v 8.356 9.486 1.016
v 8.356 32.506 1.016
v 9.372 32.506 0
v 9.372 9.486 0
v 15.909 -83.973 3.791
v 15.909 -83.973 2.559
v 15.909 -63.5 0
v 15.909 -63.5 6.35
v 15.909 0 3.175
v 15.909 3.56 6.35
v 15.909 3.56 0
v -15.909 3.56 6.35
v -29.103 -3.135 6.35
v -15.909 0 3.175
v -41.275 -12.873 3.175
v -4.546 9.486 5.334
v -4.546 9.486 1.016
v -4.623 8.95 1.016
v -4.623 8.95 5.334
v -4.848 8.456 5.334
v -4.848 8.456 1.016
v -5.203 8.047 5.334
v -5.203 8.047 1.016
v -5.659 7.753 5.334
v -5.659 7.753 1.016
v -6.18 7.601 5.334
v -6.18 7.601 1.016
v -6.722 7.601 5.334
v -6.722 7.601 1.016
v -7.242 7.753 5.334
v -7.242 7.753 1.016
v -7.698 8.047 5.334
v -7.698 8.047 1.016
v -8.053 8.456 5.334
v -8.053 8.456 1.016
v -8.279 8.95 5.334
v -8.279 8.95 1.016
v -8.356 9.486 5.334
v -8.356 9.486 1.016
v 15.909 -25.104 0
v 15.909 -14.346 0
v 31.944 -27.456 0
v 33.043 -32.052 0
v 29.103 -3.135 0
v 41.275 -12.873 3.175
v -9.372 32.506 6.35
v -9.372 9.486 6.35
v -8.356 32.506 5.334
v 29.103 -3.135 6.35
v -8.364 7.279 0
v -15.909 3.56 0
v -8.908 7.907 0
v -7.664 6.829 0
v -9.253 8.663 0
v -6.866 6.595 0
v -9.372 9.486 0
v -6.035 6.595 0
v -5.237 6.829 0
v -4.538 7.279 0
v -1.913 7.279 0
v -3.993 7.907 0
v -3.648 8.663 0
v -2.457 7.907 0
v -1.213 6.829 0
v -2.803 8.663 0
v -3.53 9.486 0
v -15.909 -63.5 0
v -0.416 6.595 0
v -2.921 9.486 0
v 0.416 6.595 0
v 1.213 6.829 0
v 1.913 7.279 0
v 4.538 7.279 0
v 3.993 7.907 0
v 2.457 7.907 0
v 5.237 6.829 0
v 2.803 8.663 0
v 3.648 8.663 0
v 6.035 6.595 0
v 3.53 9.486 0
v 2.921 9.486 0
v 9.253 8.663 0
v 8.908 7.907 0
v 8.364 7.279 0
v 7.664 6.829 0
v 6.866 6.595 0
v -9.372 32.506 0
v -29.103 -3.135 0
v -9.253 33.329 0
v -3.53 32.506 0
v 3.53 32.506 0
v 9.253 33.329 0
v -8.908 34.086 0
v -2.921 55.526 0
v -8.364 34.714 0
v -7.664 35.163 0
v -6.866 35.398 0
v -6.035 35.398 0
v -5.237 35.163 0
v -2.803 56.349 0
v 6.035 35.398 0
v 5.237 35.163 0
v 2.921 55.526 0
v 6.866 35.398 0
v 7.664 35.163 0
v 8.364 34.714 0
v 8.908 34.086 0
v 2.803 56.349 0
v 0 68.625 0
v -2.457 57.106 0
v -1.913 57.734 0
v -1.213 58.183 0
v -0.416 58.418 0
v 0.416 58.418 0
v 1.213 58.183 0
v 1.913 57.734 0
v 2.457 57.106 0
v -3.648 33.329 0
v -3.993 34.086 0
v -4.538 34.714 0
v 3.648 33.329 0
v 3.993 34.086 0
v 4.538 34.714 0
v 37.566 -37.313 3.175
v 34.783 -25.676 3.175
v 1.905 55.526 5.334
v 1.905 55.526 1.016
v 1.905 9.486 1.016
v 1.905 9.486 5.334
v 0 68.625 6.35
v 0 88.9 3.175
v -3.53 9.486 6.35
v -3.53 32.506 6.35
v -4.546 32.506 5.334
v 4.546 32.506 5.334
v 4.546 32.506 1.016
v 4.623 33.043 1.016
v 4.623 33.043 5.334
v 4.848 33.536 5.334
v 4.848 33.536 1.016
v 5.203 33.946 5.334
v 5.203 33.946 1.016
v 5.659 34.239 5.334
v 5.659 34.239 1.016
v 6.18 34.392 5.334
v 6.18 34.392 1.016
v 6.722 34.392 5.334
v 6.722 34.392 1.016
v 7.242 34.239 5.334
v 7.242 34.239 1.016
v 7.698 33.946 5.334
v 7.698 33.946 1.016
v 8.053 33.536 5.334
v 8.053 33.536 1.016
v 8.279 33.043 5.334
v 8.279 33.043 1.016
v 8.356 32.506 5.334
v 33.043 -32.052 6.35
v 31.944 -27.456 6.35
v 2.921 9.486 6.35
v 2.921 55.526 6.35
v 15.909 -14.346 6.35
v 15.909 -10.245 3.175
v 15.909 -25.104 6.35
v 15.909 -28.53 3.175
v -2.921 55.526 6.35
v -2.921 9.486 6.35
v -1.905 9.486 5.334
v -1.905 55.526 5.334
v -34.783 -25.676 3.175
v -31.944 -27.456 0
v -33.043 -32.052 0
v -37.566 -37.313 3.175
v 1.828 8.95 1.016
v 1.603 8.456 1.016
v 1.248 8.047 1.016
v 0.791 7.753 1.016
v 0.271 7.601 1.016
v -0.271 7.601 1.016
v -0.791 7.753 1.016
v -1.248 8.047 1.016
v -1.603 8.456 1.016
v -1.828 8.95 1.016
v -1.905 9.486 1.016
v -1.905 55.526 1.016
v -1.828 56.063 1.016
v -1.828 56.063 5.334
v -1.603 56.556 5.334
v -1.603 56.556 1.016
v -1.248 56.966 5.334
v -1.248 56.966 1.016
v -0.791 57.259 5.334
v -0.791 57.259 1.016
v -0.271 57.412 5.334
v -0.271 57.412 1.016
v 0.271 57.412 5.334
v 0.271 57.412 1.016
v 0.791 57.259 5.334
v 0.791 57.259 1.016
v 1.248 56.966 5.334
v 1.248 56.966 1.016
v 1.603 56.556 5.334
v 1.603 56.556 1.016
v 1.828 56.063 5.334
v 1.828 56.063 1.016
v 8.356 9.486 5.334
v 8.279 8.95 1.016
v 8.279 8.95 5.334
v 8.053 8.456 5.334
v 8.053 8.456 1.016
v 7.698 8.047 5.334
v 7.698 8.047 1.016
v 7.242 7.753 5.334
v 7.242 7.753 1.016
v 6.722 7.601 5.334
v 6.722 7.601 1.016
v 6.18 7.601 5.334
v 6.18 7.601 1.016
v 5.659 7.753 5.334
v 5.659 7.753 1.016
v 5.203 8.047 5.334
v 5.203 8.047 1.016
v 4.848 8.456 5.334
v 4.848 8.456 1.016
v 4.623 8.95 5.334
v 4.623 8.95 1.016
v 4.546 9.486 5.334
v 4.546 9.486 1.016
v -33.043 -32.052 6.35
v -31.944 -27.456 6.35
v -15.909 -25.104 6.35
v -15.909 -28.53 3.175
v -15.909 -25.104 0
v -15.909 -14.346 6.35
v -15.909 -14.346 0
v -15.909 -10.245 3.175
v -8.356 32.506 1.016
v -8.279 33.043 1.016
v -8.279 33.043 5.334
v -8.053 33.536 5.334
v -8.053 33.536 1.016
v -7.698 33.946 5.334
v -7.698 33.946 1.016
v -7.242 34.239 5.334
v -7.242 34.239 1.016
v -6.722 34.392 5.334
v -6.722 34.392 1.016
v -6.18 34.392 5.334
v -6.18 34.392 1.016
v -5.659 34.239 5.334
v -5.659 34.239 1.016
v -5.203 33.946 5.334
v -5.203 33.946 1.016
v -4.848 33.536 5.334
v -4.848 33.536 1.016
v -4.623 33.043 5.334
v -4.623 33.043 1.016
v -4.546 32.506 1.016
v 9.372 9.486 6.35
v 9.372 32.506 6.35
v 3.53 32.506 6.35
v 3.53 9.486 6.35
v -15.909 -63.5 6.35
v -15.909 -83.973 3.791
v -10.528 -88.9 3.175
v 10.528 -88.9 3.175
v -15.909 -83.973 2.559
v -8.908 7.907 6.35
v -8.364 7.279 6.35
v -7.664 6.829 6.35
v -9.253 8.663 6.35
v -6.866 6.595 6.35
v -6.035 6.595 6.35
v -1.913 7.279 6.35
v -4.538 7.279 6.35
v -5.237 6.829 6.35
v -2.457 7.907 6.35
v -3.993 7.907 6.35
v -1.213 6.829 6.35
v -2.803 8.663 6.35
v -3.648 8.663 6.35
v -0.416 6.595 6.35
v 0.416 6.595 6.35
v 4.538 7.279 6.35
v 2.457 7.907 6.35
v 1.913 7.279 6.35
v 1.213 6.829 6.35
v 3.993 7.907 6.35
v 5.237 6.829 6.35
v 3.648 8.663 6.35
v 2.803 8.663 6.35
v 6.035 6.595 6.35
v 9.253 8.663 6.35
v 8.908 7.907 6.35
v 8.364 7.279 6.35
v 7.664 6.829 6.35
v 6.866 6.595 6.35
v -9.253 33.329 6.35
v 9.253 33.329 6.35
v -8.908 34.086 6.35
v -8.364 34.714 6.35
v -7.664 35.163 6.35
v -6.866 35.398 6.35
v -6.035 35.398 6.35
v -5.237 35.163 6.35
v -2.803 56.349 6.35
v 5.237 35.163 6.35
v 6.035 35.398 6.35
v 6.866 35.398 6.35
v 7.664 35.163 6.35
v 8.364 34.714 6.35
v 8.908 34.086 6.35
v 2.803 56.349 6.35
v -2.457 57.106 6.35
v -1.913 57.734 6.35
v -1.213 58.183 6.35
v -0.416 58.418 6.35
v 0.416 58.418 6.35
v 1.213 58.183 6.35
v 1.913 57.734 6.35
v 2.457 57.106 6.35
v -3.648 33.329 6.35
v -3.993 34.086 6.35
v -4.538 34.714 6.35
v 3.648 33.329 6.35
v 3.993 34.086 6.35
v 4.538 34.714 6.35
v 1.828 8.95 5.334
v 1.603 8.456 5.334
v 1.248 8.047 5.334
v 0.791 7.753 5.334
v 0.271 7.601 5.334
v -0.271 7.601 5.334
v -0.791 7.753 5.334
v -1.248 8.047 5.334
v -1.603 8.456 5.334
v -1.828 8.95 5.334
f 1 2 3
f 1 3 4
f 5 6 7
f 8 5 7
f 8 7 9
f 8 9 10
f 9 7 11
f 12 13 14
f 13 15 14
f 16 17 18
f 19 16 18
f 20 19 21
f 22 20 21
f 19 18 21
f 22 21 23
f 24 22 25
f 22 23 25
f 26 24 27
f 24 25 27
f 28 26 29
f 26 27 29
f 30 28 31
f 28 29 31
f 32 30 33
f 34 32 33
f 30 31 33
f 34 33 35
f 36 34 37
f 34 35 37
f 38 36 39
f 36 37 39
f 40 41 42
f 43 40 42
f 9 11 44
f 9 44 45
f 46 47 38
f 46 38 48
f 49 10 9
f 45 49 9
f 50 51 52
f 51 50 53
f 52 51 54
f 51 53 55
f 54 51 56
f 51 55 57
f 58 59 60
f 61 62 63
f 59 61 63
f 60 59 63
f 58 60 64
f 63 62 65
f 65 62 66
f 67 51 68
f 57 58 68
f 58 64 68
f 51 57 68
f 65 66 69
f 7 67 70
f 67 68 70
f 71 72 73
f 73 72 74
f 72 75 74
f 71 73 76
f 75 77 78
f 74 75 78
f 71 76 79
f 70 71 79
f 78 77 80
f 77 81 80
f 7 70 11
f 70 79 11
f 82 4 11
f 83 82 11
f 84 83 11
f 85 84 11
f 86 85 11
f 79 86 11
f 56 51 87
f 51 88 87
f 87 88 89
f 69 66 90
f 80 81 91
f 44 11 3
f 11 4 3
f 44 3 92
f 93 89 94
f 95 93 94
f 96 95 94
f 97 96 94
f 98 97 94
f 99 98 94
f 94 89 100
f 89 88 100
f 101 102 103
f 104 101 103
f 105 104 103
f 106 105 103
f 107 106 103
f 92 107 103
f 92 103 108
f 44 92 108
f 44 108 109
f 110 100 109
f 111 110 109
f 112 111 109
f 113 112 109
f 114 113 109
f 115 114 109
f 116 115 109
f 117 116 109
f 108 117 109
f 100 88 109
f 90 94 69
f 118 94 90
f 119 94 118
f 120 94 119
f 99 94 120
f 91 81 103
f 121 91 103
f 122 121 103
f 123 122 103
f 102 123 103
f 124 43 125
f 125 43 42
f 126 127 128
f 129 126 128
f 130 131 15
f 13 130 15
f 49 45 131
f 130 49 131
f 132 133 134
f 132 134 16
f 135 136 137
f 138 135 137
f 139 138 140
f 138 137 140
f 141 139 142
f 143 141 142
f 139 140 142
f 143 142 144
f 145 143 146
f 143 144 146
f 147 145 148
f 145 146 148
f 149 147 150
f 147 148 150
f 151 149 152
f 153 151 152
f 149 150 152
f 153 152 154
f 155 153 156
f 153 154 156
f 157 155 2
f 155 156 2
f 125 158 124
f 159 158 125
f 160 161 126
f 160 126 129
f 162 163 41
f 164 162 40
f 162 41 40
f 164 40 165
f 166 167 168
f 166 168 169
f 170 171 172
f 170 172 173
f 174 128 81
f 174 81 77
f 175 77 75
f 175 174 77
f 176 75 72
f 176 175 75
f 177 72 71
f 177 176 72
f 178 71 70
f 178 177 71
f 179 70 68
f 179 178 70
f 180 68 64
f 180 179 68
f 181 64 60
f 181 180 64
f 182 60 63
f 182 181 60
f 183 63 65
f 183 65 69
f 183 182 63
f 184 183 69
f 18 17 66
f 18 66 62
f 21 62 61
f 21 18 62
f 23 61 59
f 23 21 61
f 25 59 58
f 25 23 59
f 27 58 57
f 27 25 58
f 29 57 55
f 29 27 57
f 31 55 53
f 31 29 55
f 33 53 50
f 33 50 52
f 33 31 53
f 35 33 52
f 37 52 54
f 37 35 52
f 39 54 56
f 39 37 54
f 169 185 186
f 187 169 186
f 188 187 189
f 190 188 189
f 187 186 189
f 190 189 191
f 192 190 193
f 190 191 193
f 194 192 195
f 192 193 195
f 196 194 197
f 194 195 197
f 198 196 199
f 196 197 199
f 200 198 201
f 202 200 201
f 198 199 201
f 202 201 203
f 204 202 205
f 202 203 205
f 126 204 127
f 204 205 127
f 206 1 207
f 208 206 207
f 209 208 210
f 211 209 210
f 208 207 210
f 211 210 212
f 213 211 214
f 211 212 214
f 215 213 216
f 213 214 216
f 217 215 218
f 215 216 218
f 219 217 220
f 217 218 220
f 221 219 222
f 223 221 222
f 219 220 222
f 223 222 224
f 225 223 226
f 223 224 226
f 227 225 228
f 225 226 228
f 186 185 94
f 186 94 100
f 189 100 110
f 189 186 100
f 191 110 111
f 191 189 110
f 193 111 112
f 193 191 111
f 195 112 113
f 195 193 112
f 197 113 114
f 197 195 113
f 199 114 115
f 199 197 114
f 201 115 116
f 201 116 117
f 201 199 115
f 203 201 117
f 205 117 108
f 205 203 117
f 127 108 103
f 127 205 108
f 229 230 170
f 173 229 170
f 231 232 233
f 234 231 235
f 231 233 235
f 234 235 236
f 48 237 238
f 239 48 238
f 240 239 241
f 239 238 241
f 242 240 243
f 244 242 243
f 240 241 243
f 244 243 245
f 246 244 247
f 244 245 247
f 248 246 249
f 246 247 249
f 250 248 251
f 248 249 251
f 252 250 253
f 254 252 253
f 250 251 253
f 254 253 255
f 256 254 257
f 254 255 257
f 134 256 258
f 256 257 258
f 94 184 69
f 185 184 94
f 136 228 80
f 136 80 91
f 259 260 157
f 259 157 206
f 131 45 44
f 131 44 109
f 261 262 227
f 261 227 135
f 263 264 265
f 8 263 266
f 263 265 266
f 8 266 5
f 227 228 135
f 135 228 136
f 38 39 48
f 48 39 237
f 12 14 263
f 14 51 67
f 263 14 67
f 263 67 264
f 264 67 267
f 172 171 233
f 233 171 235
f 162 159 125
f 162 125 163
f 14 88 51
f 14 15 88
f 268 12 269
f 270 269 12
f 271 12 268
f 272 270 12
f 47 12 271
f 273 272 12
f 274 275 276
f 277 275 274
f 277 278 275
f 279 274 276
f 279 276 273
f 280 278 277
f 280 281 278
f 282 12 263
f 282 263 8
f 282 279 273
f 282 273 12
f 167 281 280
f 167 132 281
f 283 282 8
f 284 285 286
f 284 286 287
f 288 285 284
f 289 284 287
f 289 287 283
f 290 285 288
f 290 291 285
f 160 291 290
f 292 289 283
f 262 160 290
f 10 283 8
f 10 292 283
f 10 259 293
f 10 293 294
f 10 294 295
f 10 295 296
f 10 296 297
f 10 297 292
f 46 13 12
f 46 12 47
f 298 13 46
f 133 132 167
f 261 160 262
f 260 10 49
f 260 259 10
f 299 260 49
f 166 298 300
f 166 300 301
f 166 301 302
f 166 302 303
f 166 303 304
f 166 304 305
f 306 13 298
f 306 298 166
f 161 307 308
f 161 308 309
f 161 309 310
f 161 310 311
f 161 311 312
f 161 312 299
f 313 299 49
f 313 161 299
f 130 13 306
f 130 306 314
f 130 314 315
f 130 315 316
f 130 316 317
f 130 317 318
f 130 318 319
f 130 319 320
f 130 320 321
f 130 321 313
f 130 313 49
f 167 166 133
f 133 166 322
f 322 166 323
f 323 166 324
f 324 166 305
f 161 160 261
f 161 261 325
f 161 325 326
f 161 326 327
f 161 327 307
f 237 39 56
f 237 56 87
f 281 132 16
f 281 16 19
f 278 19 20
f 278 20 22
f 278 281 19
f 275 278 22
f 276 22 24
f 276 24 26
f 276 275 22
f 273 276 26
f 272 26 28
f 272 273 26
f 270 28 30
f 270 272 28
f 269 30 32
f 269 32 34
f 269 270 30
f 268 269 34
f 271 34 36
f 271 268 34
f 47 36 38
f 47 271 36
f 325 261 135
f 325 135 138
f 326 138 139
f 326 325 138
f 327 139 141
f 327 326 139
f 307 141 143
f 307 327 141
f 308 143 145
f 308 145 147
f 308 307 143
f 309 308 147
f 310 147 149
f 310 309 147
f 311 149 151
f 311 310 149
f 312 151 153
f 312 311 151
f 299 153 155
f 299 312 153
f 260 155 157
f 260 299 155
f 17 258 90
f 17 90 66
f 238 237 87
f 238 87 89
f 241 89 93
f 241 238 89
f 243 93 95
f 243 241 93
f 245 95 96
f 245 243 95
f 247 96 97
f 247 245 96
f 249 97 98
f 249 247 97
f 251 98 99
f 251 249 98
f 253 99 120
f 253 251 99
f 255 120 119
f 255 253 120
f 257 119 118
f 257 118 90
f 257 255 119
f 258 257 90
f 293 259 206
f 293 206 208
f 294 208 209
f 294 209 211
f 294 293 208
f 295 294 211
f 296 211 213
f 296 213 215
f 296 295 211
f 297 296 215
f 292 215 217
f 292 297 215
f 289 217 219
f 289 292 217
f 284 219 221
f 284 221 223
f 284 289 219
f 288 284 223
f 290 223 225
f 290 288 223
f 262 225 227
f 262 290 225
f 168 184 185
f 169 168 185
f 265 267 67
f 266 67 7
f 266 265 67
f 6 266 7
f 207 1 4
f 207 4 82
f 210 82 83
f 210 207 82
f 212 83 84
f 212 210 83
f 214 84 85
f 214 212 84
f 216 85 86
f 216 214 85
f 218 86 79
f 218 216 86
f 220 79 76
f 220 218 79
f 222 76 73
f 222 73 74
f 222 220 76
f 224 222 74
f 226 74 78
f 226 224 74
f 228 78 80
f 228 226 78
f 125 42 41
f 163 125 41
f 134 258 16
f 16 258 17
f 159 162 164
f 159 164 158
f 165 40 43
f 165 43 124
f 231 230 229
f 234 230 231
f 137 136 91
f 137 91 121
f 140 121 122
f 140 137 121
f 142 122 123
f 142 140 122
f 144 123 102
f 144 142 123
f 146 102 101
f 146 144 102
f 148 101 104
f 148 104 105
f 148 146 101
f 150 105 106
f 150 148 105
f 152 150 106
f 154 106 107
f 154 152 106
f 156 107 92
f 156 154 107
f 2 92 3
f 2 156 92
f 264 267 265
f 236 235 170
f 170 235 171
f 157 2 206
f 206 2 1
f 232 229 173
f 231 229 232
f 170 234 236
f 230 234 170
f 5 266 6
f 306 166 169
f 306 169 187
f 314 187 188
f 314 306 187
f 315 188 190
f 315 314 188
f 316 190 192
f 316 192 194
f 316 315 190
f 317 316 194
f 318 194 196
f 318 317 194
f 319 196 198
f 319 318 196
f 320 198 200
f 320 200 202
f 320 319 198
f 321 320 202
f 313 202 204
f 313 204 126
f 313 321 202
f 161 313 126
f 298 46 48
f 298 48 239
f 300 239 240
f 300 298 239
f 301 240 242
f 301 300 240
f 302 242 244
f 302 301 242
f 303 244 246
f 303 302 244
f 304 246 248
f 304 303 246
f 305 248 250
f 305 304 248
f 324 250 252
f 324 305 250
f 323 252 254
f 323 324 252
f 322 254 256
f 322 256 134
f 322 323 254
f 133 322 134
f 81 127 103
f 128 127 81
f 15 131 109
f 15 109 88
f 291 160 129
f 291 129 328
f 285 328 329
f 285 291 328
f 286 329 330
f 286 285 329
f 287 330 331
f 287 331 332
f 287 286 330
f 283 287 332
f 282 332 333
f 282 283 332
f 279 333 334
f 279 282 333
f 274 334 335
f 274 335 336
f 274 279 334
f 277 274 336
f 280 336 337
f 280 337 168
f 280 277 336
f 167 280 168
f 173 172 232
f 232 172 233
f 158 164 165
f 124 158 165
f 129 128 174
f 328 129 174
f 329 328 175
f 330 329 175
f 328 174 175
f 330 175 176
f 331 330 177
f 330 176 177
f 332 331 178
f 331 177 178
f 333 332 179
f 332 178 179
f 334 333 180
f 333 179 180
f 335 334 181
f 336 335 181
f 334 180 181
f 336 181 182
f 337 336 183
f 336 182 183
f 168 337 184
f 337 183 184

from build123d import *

# Parameters (mm, degrees)
F1_DEPTH   = 6.35
F2_DEPTH   = 6.35
F3_DEPTH   = 6.35
F4_SIZE2   = 3.175
F4_SIZE    = 7.62
F4_2_SIZE2 = 3.17499
F4_2_SIZE  = 7.61999
F5_SIZE2   = 3.17499
F5_SIZE    = 3.17499
F6_SIZE2   = 3.17499
F6_SIZE    = 3.17499
F6_2_SIZE2 = 3.17499
F6_2_SIZE  = 3.17499
F7_SIZE    = 1.016
F8_SIZE2   = 3.175
F8_SIZE    = 25.4
F8_2_SIZE2 = 3.17499
F8_2_SIZE  = 25.39999


# Not quite as in the source:
# - a fillet or chamfer is up to 0.001 mm smaller than in the source, because OpenCascade refuses the exact size


with BuildPart() as f1:
    # F0 (on Top) → F1 (new body)
    with BuildSketch(Plane.XY):
        Polygon((41.275, -12.8728821874), (0, 88.9), (-41.275, -12.8728821874), (-15.9091800451, 0), (-15.9091800451, -10.2451825514), (-15.9091800451, -28.5296985704), (-15.9091800451, -83.9729532599), (-10.527680628, -88.9), (10.527680628, -88.9), (15.9091800451, -83.9729532599), (15.9091800451, -28.5296985704), (15.9091800451, -10.2451825514), (15.9091800451, 0), align=None)
        with BuildLine():
            Line((-8.355671237, 9.4862803817), (-8.355671237, 32.5063206255))
            ThreePointArc((-8.355671237, 32.5063206255), (-6.450671237, 34.4113206255), (-4.545671237, 32.5063206255))
            Line((-4.545671237, 32.5063206255), (-4.545671237, 9.4862803817))
            ThreePointArc((-4.545671237, 9.4862803817), (-6.450671237, 7.5812803817), (-8.355671237, 9.4862803817))
        make_face(mode=Mode.SUBTRACT)
        with BuildLine():
            Line((4.545671237, 9.4862803817), (4.545671237, 32.5063206255))
            ThreePointArc((4.545671237, 32.5063206255), (6.450671237, 34.4113206255), (8.355671237, 32.5063206255))
            Line((8.355671237, 32.5063206255), (8.355671237, 9.4862803817))
            ThreePointArc((8.355671237, 9.4862803817), (6.450671237, 7.5812803817), (4.545671237, 9.4862803817))
        make_face(mode=Mode.SUBTRACT)
        with BuildLine():
            Line((-1.905, 9.4862803817), (-1.905, 55.5263608694))
            ThreePointArc((-1.905, 55.5263608694), (0, 57.4313608694), (1.905, 55.5263608694))
            Line((1.905, 55.5263608694), (1.905, 9.4862803817))
            ThreePointArc((1.905, 9.4862803817), (0, 7.5812803817), (-1.905, 9.4862803817))
        make_face(mode=Mode.SUBTRACT)
    extrude(amount=F1_DEPTH)

    # F4
    f4_edges = [f1.edges().sort_by_distance(p)[0] for p in [
        (-20.6375, 38.013559, 0),
        (20.6375, 38.013559, 0),
    ]]
    f4_side = f1.faces().sort_by_distance((0, -6.764351, 0))[0]
    chamfer(f4_edges, length=F4_SIZE, length2=F4_SIZE2, reference=f4_side)

    # F4#2 (size 7.62 and 3.175 in the source; OpenCascade refuses exactly that, so slightly less here)
    f4_2_edges = [f1.edges().sort_by_distance(p)[0] for p in [
        (20.6375, 38.013559, 6.35),
        (-20.6375, 38.013559, 6.35),
    ]]
    f4_2_side = f1.faces().sort_by_distance((0, -6.764351, 6.35))[0]
    chamfer(f4_2_edges, length=F4_2_SIZE, length2=F4_2_SIZE2, reference=f4_2_side)

    # F5 (size 3.175 and 3.175 in the source; OpenCascade refuses exactly that, so slightly less here)
    f5_edges = [f1.edges().sort_by_distance(p)[0] for p in [
        (23.41519, -3.80922, 6.35),
        (23.415183, -3.809216, 0),
        (-23.41519, -3.80922, 6.35),
        (-23.415183, -3.809216, 0),
    ]]
    chamfer(f5_edges, length=F5_SIZE, length2=F5_SIZE2)

    # F7
    f7_edges = [f1.edges().sort_by_distance(p)[0] for p in [
        (-8.355671, 20.996301, 6.35),
        (-6.450671, 7.58128, 6.35),
        (-4.545671, 20.996301, 6.35),
        (-6.450671, 34.411321, 6.35),
        (-1.905, 32.506321, 6.35),
        (0, 7.58128, 6.35),
        (1.905, 32.506321, 6.35),
        (0, 57.431361, 6.35),
        (8.355671, 20.996301, 6.35),
        (6.450671, 34.411321, 6.35),
        (4.545671, 20.996301, 6.35),
        (6.450671, 7.58128, 6.35),
        (-6.450671, 7.58128, 0),
        (0, 7.58128, 0),
        (6.450671, 7.58128, 0),
        (4.545671, 20.996301, 0),
        (8.355671, 20.996301, 0),
        (-1.905, 32.506321, 0),
        (1.905, 32.506321, 0),
        (-4.545671, 20.996301, 0),
        (-8.355671, 20.996301, 0),
        (6.450671, 34.411321, 0),
        (-6.450671, 34.411321, 0),
        (0, 57.431361, 0),
    ]]
    chamfer(f7_edges, length=F7_SIZE)

    # F8
    f8_edges = [f1.edges().sort_by_distance(p)[0] for p in [
        (0, -88.9, 6.35),
    ]]
    f8_side = f1.faces().sort_by_distance((0, -23.545695, 6.35))[0]
    chamfer(f8_edges, length=F8_SIZE, length2=F8_SIZE2, reference=f8_side)

    # F8#2 (size 25.4 and 3.175 in the source; OpenCascade refuses exactly that, so slightly less here)
    f8_2_edges = [f1.edges().sort_by_distance(p)[0] for p in [
        (0, -88.9, 0),
    ]]
    f8_2_side = f1.faces().sort_by_distance((0, -23.545717, 0))[0]
    chamfer(f8_2_edges, length=F8_2_SIZE, length2=F8_2_SIZE2, reference=f8_2_side)


with BuildPart() as f2:
    # F0 (on Top) → F2 (new body)
    with BuildSketch(Plane.XY):
        Polygon((-15.9091800451, -28.5296985704), (-15.9091800451, -10.2451825514), (-34.7830280662, -25.6761983037), (-37.5656671822, -37.3127013445), align=None)
    extrude(amount=F2_DEPTH)

    # F6 (size 3.175 and 3.175 in the source; OpenCascade refuses exactly that, so slightly less here)
    f6_edges = [f2.edges().sort_by_distance(p)[0] for p in [
        (-25.346104, -17.96069, 6.35),
        (-25.346104, -17.96069, 0),
        (-36.174348, -31.49445, 6.35),
        (-36.174348, -31.49445, 0),
        (-26.737424, -32.9212, 0),
        (-26.737424, -32.9212, 6.35),
    ]]
    chamfer(f6_edges, length=F6_SIZE, length2=F6_SIZE2)


with BuildPart() as f3:
    # F0 (on Top) → F3 (new body)
    with BuildSketch(Plane.XY):
        Polygon((34.7830280662, -25.6761983037), (15.9091800451, -10.2451825514), (15.9091800451, -28.5296985704), (37.5656671822, -37.3127013445), align=None)
    extrude(amount=F3_DEPTH)

    # F6#2 (size 3.175 and 3.175 in the source; OpenCascade refuses exactly that, so slightly less here)
    f6_2_edges = [f3.edges().sort_by_distance(p)[0] for p in [
        (25.346104, -17.96069, 6.35),
        (25.346104, -17.96069, 0),
        (36.174348, -31.49445, 0),
        (36.174348, -31.49445, 6.35),
        (26.737424, -32.9212, 6.35),
        (26.737424, -32.9212, 0),
    ]]
    chamfer(f6_2_edges, length=F6_2_SIZE, length2=F6_2_SIZE2)


solid = Compound([f1.part, f2.part, f3.part])
